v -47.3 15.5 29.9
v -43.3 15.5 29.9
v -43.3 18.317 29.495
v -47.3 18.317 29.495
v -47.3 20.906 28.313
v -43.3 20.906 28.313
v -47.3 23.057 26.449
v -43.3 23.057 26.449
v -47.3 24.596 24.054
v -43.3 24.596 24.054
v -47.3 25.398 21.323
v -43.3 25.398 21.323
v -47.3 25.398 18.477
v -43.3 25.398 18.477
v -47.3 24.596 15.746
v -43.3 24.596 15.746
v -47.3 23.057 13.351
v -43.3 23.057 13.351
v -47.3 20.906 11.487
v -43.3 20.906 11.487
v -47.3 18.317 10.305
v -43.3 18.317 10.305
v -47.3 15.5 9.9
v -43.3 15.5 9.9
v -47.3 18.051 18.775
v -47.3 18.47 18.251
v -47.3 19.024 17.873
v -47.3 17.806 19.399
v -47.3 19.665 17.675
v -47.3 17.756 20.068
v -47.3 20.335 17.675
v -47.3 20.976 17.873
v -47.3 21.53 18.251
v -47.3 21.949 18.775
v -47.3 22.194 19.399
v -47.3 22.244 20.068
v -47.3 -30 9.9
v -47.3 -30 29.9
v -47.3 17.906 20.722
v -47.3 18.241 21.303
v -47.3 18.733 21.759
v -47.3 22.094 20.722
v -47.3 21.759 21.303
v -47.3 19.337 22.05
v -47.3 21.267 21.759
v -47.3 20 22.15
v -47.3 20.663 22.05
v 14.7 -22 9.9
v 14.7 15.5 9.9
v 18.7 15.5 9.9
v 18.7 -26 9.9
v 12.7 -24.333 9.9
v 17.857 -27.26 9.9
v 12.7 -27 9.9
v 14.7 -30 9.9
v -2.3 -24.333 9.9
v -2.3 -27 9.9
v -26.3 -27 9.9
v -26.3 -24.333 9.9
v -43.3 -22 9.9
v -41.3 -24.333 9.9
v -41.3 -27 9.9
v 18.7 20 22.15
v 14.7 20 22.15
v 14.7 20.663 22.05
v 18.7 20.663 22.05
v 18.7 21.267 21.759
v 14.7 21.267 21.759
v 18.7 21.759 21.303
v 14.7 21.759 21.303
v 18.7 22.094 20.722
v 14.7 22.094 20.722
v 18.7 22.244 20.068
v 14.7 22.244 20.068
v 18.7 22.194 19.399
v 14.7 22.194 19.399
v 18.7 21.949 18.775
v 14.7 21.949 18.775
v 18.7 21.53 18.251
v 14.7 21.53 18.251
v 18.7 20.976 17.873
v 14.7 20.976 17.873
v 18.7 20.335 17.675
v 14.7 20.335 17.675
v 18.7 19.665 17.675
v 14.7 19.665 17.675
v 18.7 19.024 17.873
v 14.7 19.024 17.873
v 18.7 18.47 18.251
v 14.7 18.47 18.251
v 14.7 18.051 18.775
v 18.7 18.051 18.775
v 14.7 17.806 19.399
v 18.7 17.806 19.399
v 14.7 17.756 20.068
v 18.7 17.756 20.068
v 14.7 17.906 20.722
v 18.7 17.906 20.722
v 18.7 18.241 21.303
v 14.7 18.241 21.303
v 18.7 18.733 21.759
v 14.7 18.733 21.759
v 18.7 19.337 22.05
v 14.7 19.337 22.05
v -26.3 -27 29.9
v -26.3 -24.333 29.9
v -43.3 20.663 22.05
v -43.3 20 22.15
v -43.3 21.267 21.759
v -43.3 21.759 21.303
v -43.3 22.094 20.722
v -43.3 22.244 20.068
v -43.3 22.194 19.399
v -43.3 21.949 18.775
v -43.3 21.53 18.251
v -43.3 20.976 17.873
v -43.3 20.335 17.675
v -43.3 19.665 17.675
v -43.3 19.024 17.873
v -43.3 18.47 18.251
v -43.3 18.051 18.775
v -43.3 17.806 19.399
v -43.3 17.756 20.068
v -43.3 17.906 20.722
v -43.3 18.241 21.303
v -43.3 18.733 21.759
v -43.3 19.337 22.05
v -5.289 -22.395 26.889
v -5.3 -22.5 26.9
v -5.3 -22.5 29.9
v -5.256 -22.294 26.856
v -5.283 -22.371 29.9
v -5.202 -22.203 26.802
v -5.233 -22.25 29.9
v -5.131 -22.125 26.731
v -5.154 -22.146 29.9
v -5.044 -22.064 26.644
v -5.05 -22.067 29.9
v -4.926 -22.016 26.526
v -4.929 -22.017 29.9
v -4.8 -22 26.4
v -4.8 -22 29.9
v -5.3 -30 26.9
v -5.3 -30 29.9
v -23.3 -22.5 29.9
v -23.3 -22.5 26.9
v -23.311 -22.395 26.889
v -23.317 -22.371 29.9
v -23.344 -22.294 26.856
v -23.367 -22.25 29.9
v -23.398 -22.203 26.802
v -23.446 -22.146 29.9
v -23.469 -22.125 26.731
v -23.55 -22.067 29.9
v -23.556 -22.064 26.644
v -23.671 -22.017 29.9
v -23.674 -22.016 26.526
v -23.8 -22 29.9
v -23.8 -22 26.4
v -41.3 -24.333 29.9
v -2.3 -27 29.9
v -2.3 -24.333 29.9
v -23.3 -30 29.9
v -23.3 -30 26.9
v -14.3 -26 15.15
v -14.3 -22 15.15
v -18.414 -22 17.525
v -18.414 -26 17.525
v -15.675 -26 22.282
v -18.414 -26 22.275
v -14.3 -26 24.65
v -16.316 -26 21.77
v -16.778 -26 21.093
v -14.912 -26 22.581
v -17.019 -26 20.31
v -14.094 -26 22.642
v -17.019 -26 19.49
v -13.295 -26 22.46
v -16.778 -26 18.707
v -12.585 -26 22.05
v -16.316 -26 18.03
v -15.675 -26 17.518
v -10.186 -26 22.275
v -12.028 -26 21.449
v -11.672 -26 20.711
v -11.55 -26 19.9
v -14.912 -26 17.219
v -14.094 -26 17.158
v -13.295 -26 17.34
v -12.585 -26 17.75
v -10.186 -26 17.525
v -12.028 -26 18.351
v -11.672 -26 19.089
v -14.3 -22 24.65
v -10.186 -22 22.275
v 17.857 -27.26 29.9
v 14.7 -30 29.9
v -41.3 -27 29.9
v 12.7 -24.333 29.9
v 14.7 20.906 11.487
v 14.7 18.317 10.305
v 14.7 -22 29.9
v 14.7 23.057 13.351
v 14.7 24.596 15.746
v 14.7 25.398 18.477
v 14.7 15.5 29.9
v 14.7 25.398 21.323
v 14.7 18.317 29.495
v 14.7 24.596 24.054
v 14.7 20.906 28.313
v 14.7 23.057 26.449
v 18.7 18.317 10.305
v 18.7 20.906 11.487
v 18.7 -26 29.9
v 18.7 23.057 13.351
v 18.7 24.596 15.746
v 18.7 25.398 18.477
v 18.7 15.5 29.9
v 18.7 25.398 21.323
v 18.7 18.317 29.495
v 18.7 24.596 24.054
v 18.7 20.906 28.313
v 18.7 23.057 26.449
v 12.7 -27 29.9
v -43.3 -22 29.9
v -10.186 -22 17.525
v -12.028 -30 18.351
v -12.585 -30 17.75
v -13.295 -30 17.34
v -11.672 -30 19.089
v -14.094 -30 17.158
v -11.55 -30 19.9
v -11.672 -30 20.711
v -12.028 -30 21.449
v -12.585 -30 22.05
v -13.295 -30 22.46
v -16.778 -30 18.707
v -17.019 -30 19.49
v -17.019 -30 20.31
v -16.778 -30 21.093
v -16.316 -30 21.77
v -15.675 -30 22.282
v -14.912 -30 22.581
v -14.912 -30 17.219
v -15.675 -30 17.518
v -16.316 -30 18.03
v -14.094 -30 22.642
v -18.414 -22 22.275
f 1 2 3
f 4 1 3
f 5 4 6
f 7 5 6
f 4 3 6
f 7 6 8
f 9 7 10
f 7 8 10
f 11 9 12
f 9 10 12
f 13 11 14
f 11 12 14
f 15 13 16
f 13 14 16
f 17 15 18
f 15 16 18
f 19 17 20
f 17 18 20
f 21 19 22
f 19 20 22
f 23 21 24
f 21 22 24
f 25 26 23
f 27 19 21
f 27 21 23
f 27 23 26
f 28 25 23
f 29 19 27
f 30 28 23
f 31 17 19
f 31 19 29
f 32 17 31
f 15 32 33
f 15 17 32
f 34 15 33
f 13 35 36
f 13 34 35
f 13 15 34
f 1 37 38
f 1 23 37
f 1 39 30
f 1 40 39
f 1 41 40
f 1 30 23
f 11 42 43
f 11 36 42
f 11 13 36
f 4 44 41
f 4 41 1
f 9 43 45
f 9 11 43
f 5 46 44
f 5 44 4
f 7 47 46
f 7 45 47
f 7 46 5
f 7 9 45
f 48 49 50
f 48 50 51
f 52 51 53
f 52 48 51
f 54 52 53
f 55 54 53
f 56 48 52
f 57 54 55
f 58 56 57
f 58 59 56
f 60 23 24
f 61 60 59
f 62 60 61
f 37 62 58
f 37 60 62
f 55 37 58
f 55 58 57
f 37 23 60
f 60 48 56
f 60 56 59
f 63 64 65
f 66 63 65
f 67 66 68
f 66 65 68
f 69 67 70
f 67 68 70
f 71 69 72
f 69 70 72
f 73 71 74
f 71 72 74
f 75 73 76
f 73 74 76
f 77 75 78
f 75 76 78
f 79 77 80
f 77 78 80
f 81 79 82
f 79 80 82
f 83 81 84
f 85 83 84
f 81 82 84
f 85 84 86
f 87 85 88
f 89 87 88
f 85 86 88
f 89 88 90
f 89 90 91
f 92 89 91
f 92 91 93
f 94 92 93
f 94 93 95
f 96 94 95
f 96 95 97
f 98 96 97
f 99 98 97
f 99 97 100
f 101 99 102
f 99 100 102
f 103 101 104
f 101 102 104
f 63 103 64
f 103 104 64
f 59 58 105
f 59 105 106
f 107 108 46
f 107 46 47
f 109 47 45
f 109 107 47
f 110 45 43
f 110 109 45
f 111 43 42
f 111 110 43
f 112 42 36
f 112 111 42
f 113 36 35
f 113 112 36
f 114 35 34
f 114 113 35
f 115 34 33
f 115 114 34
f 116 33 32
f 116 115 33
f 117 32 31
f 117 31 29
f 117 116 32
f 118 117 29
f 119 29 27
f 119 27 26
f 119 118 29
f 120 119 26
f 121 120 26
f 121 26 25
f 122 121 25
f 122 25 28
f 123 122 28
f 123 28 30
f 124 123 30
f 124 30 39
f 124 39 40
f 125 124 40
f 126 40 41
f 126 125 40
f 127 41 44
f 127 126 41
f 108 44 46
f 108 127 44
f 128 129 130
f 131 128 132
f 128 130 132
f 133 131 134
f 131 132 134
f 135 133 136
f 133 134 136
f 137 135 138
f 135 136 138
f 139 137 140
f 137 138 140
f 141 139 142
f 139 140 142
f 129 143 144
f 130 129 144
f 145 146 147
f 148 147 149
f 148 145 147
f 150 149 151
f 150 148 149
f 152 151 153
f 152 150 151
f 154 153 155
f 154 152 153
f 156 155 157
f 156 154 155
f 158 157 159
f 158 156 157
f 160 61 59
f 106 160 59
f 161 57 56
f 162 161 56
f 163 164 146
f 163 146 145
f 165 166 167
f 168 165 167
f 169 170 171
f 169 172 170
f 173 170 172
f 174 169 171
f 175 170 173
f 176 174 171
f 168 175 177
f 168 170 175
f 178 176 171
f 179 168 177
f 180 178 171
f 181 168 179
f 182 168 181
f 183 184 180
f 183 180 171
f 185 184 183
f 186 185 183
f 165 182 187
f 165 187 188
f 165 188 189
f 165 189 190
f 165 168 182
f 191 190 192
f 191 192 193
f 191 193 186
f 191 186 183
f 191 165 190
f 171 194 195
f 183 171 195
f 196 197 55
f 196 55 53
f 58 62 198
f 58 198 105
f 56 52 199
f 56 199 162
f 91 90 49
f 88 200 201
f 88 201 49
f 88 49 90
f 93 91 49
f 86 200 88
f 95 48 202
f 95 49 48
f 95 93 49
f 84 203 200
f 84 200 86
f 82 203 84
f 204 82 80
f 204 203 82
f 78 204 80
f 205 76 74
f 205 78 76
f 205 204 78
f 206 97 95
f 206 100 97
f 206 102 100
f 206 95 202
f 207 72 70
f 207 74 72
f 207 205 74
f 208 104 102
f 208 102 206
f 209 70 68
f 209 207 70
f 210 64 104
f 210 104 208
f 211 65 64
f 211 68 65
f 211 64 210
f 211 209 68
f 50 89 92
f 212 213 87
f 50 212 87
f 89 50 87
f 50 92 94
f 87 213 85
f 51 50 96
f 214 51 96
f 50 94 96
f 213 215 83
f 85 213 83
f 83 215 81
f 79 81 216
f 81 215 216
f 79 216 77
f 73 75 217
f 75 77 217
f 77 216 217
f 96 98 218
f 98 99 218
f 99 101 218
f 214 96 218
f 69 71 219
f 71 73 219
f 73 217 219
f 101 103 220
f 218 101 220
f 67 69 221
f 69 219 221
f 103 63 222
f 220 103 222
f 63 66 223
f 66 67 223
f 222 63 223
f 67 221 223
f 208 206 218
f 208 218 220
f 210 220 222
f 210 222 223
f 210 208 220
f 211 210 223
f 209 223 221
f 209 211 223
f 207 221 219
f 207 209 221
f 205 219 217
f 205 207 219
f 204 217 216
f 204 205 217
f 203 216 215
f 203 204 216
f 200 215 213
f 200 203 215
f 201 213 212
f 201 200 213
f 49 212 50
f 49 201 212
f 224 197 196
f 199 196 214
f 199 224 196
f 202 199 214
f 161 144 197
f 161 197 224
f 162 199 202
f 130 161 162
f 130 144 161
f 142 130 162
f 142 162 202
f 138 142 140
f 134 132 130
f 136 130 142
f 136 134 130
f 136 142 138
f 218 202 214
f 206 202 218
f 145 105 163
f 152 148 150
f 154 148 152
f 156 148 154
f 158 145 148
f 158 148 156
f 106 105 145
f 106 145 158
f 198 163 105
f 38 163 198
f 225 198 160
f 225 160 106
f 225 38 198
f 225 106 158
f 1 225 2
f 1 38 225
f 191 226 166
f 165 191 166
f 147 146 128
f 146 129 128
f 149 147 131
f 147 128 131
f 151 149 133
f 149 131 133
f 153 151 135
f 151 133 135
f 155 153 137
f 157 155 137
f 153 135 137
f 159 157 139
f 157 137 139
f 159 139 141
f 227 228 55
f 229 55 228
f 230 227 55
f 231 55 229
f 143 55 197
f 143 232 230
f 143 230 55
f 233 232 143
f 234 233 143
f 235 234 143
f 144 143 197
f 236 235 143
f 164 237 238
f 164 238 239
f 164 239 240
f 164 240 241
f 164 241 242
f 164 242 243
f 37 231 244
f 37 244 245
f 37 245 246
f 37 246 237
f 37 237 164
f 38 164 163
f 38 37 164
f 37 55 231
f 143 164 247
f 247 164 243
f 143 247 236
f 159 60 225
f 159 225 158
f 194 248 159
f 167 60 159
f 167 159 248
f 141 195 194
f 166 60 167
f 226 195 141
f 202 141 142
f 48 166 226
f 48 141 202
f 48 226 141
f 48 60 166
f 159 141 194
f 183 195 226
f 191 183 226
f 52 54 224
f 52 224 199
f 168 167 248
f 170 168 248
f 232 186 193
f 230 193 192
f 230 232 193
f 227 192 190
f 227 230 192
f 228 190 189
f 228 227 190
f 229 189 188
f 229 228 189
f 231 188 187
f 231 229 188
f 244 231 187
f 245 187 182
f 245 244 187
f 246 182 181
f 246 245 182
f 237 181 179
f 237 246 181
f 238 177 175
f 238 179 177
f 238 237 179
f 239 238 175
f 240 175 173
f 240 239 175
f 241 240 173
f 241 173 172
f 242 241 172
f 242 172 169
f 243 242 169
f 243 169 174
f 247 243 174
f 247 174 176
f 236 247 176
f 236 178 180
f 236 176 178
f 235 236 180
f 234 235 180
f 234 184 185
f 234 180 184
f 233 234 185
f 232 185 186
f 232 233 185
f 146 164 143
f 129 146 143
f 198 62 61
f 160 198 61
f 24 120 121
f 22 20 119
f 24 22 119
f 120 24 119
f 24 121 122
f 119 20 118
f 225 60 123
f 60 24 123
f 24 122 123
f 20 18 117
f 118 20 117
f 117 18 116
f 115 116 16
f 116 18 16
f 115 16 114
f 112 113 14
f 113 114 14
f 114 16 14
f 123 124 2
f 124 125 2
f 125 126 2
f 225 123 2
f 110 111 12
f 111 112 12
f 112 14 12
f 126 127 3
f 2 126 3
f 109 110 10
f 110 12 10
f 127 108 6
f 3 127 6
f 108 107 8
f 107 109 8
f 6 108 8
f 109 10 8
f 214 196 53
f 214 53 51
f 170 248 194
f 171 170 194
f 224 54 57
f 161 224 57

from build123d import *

# Parameters (mm, degrees)
SKETCH005_W             = 58
SKETCH005_H             = 20
SKETCH005_R             = 2.75
PAD004_DEPTH            = 8
SKETCH006_R             = 2.25
PAD005_DEPTH            = 4
POCKET005_DEPTH         = 4
SKETCH011_W             = 15
SKETCH011_H             = 2.666667
POCKET007_DEPTH         = 20
SKETCH012_W             = 18
SKETCH012_H             = 3
POCKET008_DEPTH         = 8
FILLET_R                = 0.5
POCKET009_DEPTH         = 20
BODY002_PLACEMENT_ANGLE = 180


with BuildPart() as part:
    # Sketch005 → Pad004 (new body)
    with BuildSketch(Plane.XZ):
        Rectangle(SKETCH005_W, SKETCH005_H)
        Circle(SKETCH005_R, mode=Mode.SUBTRACT)
    extrude(amount=PAD004_DEPTH)

    # Sketch006 (on Face4 of Pad004) → Pad005 (join)
    with BuildSketch(Plane(origin=(-29, 0, 0), x_dir=(0, 0, -1), z_dir=(-1, 0, 0))):
        with BuildLine():
            Line((-10, 0), (10, 0))
            Line((10, 0), (10, 45.5))
            ThreePointArc((10, 45.5), (0, 55.5), (-10, 45.5))
            Line((-10, 45.5), (-10, 0))
        make_face()
        with Locations((0, 50)):
            Circle(SKETCH006_R, mode=Mode.SUBTRACT)
    pad005 = extrude(amount=PAD005_DEPTH)

    # Mirrored003: Pad005 across YZ
    add(pad005.mirror(Plane.YZ))

    # Sketch007 (on Face5 of Mirrored003) → Pocket005 (cut)
    with BuildSketch(Plane.XZ.offset(8)):
        Polygon((4.113621, 2.375), (0, 4.75), (-4.113621, 2.375), (-4.113621, -2.375), (0, -4.75), (4.113621, -2.375), align=None)
    extrude(amount=-POCKET005_DEPTH, mode=Mode.SUBTRACT)

    # Sketch011 (on Face14 of Pocket005) → Pocket007 (cut)
    with BuildSketch(Plane(origin=(0, 0, 10), x_dir=(-1, 0, 0), z_dir=(0, 0, 1))):
        with Locations((-19.5, 4.333334)):
            Rectangle(SKETCH011_W, SKETCH011_H)
    pocket007 = extrude(amount=-POCKET007_DEPTH, mode=Mode.SUBTRACT)

    # Mirrored004: Pocket007 across YZ
    add(pocket007.mirror(Plane.YZ), mode=Mode.SUBTRACT)

    # Sketch012 (on Face3 of Mirrored004) → Pocket008 (cut)
    with BuildSketch(Plane(origin=(0, 0, 0), x_dir=(1, 0, 0), z_dir=(0, 1, 0))):
        with Locations((0, 8.5)):
            Rectangle(SKETCH012_W, SKETCH012_H)
    extrude(amount=-POCKET008_DEPTH, mode=Mode.SUBTRACT)

    # Fillet
    fillet_edges = [part.edges().sort_by_distance(p)[0] for p in [
        (0, -8, -7),
        (9, -8, -8.5),
        (-9, -8, -8.5),
    ]]
    fillet(fillet_edges, radius=FILLET_R)

    # Sketch013 (on Face35 of Fillet) → Pocket009 (cut)
    with BuildSketch(Plane(origin=(0, 0, 10), x_dir=(-1, 0, 0), z_dir=(0, 0, 1))):
        Polygon((-29, 0), (-32.156707, 2.74), (-33, 4), (-33, 0), align=None)
    extrude(amount=-POCKET009_DEPTH, mode=Mode.SUBTRACT)


with BuildPart() as part_1:
    # Body002 placement: moved
    add(part.part.moved(Location((-14.3, -30, 19.9))).rotate(Axis((-14.3, -30, 19.9), (1, 0, 0)), BODY002_PLACEMENT_ANGLE))


solid = part_1.part
